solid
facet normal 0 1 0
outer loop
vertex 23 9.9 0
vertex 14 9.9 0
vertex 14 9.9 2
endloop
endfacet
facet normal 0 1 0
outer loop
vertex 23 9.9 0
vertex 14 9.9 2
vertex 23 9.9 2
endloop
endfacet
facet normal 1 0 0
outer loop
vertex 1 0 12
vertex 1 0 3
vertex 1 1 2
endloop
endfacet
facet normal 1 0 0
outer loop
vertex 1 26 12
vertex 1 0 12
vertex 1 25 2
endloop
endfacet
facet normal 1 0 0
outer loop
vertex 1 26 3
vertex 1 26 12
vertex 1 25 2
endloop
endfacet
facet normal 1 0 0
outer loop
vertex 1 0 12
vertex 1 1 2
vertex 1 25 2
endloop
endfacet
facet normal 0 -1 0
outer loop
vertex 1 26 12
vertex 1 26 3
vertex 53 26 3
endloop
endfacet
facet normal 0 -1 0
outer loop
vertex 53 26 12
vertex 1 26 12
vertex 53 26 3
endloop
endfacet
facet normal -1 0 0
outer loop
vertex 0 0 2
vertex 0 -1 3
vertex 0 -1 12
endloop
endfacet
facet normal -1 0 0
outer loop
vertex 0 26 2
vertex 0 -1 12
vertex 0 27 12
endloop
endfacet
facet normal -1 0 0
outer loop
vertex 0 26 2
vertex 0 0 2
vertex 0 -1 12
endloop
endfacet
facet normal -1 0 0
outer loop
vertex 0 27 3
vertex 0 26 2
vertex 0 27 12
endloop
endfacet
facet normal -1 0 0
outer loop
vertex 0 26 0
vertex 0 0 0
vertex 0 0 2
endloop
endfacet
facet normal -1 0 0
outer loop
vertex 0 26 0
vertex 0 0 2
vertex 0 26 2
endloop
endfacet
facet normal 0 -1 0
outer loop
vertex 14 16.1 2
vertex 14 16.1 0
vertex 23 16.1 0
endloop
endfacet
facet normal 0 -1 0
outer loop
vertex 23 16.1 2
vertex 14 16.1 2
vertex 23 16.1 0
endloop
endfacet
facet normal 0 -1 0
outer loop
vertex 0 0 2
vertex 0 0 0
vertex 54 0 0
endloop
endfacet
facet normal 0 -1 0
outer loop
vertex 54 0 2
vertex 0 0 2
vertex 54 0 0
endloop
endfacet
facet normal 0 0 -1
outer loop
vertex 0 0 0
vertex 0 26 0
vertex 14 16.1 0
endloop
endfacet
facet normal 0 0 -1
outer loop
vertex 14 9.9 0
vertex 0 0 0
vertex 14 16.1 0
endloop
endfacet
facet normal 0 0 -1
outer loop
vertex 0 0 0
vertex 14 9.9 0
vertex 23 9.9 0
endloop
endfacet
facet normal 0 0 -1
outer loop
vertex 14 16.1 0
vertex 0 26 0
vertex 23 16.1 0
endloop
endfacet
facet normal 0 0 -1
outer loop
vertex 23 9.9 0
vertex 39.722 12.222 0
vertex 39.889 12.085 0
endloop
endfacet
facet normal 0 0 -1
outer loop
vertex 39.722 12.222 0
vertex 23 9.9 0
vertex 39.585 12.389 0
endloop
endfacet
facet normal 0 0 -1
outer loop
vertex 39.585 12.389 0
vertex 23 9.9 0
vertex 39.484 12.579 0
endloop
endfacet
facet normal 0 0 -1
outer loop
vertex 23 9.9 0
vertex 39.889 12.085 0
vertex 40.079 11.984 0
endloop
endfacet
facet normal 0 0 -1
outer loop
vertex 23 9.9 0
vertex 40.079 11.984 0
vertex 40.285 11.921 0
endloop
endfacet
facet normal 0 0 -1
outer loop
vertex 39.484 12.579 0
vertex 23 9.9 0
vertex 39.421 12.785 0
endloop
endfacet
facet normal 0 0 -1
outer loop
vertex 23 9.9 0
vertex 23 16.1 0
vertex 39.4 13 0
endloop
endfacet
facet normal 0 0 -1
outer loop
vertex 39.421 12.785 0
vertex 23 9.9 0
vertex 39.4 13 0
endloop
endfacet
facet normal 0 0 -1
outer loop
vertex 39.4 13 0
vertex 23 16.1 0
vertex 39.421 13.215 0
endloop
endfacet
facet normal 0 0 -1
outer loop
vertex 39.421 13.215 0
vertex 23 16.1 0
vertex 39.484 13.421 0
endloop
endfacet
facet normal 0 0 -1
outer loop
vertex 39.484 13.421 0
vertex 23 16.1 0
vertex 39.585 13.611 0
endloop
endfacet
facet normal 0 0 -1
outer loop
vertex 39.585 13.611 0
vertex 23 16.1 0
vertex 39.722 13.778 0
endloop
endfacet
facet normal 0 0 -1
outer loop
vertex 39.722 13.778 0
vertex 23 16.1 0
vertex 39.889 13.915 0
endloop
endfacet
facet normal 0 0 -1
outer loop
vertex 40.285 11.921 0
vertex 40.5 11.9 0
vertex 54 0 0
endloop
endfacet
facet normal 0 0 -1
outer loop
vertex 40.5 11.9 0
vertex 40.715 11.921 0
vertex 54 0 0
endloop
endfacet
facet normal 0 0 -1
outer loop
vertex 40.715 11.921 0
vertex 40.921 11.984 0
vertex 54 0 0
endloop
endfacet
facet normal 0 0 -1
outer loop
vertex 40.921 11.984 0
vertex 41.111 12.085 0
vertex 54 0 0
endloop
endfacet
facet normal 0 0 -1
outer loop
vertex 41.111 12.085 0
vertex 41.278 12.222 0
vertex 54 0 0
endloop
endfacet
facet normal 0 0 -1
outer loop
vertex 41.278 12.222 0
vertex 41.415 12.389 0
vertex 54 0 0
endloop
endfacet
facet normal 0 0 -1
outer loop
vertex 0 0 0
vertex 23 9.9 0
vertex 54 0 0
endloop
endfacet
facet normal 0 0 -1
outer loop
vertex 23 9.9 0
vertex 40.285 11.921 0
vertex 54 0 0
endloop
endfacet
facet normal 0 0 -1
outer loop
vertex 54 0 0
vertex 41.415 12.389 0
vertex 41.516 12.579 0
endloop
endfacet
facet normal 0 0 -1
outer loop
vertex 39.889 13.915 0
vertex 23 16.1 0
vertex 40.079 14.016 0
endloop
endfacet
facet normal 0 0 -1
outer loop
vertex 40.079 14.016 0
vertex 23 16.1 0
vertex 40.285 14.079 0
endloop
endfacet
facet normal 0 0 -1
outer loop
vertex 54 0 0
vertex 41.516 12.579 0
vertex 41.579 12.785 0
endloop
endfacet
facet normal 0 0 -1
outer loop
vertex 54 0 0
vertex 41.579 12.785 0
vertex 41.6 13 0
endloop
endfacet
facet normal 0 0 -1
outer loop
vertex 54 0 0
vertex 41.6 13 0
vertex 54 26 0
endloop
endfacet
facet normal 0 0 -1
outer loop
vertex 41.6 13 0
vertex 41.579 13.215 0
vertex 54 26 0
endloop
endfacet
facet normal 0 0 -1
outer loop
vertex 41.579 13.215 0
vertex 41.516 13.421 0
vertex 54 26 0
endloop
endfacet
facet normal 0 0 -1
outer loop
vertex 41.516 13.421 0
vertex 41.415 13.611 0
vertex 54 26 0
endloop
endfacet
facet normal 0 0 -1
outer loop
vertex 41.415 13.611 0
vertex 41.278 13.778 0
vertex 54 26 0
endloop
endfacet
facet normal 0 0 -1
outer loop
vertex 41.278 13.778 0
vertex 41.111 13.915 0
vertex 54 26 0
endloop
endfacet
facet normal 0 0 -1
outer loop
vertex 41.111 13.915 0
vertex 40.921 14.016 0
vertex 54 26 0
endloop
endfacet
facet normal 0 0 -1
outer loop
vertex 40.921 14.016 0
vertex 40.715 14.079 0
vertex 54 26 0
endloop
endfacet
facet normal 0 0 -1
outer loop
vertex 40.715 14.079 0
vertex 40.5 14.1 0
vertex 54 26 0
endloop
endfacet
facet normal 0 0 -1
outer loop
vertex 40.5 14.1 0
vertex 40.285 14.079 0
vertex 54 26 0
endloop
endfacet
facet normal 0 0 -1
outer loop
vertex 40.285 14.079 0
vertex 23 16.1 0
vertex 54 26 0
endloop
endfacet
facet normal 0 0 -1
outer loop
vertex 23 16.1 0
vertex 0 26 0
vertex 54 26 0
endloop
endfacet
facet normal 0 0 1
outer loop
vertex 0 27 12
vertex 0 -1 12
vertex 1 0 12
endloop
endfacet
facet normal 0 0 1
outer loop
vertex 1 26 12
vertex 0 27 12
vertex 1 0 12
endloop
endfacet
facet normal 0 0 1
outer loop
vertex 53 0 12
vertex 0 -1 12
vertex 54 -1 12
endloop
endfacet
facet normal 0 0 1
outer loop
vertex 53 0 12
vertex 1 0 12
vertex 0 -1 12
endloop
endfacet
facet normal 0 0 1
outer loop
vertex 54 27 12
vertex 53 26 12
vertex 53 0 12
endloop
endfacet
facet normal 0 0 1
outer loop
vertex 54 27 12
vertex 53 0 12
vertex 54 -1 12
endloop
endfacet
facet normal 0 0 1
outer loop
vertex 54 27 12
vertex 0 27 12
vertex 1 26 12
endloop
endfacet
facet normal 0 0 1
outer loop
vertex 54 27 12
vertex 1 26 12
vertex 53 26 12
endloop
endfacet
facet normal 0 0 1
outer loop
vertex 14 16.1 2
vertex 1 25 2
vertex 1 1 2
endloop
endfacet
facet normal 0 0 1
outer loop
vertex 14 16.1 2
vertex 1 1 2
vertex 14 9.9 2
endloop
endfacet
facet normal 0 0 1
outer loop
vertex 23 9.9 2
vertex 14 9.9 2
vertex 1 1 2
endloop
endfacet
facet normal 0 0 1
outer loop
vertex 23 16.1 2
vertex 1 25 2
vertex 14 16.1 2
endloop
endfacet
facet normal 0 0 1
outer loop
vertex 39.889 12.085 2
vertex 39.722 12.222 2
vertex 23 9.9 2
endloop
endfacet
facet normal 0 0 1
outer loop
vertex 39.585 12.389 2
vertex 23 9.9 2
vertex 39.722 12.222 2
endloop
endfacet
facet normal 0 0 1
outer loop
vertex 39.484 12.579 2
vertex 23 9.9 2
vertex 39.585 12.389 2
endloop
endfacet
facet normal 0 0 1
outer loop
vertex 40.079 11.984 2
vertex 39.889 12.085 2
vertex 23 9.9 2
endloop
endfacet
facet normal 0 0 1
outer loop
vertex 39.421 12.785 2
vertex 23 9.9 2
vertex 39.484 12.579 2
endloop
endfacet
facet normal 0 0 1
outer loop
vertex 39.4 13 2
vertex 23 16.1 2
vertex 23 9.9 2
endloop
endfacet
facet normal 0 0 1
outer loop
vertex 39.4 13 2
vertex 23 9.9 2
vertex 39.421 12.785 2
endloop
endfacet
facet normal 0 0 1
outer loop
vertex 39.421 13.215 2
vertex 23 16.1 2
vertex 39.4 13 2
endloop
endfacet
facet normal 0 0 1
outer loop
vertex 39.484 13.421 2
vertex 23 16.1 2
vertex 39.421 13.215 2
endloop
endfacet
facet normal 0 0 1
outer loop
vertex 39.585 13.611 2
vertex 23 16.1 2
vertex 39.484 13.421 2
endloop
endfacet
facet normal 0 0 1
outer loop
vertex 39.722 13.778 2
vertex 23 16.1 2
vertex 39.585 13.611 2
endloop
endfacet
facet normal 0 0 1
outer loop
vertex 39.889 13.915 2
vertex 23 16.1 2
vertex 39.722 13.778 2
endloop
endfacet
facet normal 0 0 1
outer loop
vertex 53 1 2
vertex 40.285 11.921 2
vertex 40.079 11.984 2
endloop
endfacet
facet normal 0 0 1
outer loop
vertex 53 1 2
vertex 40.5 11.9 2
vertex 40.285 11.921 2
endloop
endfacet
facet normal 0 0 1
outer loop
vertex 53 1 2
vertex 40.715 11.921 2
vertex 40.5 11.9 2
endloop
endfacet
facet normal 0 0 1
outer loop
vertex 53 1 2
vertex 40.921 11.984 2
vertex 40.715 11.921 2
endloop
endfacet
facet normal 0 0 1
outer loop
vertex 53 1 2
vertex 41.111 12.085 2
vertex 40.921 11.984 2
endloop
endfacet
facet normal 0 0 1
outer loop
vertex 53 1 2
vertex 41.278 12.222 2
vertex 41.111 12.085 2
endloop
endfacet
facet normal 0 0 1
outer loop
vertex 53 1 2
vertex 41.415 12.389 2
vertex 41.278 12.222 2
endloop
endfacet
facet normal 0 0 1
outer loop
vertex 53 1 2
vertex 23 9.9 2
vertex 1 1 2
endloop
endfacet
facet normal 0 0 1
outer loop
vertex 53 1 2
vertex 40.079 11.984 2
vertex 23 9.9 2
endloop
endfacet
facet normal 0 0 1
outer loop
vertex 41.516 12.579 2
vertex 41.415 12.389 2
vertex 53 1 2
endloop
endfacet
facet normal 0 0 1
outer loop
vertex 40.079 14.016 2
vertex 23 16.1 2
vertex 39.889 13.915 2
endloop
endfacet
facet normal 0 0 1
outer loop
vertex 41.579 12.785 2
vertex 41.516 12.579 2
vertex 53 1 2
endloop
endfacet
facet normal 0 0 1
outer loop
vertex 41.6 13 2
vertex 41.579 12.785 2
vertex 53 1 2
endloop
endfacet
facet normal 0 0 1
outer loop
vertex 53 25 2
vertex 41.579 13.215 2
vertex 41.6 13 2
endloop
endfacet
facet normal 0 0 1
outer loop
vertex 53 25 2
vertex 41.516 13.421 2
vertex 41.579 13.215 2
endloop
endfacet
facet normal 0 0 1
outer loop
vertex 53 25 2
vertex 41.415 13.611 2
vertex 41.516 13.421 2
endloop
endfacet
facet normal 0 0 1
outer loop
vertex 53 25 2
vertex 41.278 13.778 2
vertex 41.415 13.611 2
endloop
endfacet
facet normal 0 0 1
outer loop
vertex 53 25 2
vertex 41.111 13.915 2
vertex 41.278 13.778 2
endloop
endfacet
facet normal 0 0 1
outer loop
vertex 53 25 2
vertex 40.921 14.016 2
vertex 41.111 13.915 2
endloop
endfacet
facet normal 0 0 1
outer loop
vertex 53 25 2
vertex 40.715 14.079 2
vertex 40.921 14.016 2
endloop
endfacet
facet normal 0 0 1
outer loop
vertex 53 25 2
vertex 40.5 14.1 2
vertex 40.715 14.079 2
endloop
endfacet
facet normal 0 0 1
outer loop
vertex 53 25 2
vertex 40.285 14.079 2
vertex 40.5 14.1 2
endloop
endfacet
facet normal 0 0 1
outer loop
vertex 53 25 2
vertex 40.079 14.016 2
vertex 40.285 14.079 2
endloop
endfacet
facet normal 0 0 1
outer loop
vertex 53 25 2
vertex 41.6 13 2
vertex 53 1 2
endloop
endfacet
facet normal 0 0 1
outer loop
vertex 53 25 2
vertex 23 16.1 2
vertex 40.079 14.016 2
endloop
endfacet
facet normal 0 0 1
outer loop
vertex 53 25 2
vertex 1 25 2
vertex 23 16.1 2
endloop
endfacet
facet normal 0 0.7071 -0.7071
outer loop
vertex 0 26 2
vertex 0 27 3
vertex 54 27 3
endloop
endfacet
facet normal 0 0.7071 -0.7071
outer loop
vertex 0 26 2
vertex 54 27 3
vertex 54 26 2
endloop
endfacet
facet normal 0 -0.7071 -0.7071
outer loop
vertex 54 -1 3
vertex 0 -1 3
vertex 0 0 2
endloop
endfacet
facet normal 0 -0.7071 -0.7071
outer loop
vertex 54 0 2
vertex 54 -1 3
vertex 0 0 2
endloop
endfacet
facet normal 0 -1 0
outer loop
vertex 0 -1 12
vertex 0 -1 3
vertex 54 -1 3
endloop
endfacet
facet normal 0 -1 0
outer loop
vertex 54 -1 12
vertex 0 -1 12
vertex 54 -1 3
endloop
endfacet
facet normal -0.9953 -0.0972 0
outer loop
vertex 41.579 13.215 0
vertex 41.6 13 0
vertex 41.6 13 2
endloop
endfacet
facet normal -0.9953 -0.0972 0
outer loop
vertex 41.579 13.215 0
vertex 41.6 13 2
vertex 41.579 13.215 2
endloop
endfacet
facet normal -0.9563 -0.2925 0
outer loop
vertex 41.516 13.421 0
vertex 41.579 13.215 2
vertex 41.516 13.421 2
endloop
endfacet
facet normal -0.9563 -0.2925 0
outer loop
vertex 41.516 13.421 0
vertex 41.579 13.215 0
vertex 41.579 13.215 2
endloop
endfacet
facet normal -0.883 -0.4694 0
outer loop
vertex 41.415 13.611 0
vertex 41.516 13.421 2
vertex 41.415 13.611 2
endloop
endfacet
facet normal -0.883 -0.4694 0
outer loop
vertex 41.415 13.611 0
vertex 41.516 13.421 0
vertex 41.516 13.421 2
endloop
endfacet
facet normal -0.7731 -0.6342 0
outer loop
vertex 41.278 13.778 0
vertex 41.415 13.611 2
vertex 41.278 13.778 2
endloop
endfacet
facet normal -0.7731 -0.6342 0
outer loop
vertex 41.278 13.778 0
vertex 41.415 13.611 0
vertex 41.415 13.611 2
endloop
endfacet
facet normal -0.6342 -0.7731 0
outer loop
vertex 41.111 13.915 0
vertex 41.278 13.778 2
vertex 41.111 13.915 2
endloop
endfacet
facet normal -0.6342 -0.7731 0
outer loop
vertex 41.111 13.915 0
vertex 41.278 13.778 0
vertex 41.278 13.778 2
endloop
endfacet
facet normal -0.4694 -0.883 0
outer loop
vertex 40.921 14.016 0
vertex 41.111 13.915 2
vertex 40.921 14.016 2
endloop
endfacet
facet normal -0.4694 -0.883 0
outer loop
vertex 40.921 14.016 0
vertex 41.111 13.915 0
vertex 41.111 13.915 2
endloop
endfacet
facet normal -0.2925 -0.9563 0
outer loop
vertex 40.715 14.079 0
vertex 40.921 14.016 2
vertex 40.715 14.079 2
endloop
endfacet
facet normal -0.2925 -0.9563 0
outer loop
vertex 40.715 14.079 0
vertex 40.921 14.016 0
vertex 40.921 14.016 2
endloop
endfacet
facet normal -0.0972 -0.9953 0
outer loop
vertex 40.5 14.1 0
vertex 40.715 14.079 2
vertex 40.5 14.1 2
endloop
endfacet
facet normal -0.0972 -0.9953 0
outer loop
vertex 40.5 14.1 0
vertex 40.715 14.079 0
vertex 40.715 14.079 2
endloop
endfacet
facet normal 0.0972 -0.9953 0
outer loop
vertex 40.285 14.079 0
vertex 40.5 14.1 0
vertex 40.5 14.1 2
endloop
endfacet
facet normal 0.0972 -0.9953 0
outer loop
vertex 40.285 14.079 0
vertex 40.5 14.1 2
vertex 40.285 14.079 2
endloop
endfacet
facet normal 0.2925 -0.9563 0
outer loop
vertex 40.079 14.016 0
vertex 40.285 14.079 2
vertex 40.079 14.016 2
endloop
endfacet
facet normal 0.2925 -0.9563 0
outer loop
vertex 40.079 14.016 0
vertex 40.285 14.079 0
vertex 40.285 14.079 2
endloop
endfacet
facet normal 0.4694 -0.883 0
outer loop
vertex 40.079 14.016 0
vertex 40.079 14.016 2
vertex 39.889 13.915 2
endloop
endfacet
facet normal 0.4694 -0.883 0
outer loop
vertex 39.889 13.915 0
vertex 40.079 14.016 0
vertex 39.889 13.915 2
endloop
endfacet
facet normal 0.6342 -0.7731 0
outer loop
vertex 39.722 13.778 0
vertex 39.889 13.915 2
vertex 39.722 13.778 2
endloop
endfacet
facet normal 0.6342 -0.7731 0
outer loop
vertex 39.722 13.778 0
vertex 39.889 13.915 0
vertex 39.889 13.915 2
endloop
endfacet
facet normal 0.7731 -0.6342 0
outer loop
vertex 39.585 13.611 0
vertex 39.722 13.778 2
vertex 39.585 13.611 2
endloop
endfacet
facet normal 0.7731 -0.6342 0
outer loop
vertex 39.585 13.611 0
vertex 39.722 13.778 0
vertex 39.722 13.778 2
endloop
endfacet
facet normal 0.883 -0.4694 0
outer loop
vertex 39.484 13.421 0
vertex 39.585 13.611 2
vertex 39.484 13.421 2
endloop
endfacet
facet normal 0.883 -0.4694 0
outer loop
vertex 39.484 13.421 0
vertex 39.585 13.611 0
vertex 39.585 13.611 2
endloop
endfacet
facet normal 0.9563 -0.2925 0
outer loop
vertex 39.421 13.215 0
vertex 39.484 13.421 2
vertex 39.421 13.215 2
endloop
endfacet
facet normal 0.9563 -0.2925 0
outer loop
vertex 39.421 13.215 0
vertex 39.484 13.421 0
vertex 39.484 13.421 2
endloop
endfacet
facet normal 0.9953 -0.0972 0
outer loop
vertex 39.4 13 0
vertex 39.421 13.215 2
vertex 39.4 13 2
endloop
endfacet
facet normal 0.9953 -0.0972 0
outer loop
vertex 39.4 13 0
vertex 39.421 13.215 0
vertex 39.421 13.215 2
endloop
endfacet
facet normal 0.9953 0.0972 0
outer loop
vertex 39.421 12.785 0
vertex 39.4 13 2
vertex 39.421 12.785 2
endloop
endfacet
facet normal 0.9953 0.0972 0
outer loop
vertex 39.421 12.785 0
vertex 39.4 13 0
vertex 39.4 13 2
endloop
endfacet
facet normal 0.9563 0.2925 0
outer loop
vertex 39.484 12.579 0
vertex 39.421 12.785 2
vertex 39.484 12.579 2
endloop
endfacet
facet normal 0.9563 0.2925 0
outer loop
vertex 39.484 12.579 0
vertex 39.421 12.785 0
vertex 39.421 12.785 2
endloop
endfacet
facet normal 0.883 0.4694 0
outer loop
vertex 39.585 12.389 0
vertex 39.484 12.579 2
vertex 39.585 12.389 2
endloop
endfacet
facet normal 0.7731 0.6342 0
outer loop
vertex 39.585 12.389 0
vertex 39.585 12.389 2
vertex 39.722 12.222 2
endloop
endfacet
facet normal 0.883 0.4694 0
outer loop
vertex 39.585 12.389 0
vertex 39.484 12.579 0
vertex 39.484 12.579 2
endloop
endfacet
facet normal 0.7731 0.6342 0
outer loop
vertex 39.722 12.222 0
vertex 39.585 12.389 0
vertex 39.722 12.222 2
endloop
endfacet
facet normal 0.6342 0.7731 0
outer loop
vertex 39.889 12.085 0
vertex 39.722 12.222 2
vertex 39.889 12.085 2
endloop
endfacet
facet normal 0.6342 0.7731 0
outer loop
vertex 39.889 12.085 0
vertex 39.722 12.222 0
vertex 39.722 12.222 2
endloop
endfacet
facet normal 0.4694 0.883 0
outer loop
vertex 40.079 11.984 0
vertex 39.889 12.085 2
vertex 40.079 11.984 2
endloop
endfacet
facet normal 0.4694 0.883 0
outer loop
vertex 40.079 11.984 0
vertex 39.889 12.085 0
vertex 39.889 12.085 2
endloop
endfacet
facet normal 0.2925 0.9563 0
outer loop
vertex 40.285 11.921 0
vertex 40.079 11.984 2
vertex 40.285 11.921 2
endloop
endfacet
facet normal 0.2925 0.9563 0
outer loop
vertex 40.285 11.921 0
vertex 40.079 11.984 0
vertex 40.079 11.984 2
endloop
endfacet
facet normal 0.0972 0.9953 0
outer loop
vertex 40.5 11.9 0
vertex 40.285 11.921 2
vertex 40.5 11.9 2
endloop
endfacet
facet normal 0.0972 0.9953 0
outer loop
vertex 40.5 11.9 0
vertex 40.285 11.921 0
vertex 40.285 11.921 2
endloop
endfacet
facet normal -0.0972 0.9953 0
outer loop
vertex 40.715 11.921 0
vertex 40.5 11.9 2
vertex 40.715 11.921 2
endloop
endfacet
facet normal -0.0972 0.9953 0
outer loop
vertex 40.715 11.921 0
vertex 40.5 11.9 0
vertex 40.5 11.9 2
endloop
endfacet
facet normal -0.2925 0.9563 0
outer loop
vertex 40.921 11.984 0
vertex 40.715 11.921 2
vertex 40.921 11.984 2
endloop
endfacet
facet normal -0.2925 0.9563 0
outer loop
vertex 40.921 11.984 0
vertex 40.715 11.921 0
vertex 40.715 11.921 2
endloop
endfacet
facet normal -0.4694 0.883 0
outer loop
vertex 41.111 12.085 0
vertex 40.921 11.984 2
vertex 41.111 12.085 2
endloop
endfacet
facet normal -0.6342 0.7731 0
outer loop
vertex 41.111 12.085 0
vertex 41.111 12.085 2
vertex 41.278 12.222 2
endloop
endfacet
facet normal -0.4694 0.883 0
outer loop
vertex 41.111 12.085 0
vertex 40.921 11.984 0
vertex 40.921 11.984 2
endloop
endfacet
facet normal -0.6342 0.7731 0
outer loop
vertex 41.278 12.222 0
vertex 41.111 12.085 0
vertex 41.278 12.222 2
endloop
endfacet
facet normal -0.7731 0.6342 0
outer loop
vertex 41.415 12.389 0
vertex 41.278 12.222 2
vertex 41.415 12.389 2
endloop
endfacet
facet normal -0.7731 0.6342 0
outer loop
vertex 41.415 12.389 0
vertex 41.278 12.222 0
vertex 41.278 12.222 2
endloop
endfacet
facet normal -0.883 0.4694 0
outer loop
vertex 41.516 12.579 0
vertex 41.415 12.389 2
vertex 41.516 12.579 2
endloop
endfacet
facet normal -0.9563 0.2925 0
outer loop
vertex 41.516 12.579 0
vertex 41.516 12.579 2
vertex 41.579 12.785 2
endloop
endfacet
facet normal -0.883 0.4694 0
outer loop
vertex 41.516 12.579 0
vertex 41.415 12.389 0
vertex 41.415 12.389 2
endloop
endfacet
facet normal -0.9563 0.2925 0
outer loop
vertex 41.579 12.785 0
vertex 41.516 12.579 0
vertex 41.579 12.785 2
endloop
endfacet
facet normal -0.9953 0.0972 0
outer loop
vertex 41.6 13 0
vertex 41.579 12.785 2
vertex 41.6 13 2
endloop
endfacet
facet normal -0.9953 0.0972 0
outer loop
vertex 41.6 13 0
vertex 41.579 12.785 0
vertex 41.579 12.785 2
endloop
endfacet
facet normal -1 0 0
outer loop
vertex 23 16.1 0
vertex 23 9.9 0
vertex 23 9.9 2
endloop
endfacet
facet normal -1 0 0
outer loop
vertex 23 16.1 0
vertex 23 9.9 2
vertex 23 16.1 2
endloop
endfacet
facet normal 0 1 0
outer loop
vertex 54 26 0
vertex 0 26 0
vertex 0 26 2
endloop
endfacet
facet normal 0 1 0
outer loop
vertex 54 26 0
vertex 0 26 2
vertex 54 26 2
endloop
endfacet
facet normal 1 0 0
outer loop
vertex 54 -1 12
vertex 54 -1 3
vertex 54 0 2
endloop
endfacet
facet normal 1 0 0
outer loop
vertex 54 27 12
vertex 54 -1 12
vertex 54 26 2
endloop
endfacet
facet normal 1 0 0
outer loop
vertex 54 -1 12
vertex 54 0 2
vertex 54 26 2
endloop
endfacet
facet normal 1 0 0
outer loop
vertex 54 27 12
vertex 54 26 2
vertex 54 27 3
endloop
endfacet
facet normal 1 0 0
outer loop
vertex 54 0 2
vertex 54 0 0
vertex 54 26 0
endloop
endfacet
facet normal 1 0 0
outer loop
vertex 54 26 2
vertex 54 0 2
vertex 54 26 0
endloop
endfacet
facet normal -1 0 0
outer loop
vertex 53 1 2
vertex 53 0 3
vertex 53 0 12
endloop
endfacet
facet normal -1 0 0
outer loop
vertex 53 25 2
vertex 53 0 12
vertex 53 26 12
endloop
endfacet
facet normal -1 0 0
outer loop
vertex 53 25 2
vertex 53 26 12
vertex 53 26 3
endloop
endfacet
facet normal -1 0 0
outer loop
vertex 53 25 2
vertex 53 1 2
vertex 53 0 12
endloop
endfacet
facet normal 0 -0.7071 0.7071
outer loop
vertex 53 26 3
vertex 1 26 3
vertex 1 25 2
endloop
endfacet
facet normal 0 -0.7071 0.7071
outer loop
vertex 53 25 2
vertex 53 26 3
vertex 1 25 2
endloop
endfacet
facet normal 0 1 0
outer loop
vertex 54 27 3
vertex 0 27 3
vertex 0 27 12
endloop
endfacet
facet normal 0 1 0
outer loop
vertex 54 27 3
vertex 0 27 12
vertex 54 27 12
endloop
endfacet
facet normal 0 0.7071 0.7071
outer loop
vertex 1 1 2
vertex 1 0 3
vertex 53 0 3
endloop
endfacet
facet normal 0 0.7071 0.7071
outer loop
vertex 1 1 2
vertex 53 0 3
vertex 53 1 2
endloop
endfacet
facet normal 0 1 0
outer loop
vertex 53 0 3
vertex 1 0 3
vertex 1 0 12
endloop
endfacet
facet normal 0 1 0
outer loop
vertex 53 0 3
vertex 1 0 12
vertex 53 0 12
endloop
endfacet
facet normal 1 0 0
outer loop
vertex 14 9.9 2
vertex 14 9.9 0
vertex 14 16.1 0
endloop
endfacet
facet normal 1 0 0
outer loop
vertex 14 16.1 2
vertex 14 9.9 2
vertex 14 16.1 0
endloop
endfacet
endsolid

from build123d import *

# Parameters (mm, degrees)
SKETCH_W      = 54
SKETCH_H      = 26
SKETCH_R      = 1.1
SKETCH_W_2    = 9
SKETCH_H_2    = 6.2
PAD_DEPTH     = 2
SKETCH001_W   = 54
SKETCH001_H   = 28
SKETCH001_W_2 = 52
SKETCH001_H_2 = 26
PAD001_DEPTH  = 10
PAD002_DEPTH  = 52
POCKET_DEPTH  = 54.001


with BuildPart() as part:
    # Sketch → Pad (new body)
    with BuildSketch(Plane.XY):
        with Locations((27, 13)):
            Rectangle(SKETCH_W, SKETCH_H)
        with Locations((40.5, 13)):
            Circle(SKETCH_R, mode=Mode.SUBTRACT)
        with Locations((18.5, 13)):
            Rectangle(SKETCH_W_2, SKETCH_H_2, mode=Mode.SUBTRACT)
    extrude(amount=PAD_DEPTH)

    # Sketch001 (on Face11 of Pad) → Pad001 (join)
    with BuildSketch(Plane.XY.offset(2)):
        with Locations((27, 13)):
            Rectangle(SKETCH001_W, SKETCH001_H)
        with Locations((27, 13)):
            Rectangle(SKETCH001_W_2, SKETCH001_H_2, mode=Mode.SUBTRACT)
    extrude(amount=PAD001_DEPTH)

    # Sketch002 (on Face22 of Pad001) → Pad002 (join)
    with BuildSketch(Plane.YZ.offset(1)):
        Polygon((0, 2), (0, 3), (1, 2), align=None)
        Polygon((26, 2), (26, 3), (25, 2), align=None)
    extrude(amount=PAD002_DEPTH)

    # Sketch003 (on Face8 of Pad002) → Pocket (cut, through all)
    with BuildSketch(Plane.YZ.offset(54)):
        Polygon((-1, 2), (-1, 3), (0, 2), align=None)
        Polygon((27, 2), (27, 3), (26, 2), align=None)
    extrude(amount=-POCKET_DEPTH, mode=Mode.SUBTRACT)


solid = part.part
